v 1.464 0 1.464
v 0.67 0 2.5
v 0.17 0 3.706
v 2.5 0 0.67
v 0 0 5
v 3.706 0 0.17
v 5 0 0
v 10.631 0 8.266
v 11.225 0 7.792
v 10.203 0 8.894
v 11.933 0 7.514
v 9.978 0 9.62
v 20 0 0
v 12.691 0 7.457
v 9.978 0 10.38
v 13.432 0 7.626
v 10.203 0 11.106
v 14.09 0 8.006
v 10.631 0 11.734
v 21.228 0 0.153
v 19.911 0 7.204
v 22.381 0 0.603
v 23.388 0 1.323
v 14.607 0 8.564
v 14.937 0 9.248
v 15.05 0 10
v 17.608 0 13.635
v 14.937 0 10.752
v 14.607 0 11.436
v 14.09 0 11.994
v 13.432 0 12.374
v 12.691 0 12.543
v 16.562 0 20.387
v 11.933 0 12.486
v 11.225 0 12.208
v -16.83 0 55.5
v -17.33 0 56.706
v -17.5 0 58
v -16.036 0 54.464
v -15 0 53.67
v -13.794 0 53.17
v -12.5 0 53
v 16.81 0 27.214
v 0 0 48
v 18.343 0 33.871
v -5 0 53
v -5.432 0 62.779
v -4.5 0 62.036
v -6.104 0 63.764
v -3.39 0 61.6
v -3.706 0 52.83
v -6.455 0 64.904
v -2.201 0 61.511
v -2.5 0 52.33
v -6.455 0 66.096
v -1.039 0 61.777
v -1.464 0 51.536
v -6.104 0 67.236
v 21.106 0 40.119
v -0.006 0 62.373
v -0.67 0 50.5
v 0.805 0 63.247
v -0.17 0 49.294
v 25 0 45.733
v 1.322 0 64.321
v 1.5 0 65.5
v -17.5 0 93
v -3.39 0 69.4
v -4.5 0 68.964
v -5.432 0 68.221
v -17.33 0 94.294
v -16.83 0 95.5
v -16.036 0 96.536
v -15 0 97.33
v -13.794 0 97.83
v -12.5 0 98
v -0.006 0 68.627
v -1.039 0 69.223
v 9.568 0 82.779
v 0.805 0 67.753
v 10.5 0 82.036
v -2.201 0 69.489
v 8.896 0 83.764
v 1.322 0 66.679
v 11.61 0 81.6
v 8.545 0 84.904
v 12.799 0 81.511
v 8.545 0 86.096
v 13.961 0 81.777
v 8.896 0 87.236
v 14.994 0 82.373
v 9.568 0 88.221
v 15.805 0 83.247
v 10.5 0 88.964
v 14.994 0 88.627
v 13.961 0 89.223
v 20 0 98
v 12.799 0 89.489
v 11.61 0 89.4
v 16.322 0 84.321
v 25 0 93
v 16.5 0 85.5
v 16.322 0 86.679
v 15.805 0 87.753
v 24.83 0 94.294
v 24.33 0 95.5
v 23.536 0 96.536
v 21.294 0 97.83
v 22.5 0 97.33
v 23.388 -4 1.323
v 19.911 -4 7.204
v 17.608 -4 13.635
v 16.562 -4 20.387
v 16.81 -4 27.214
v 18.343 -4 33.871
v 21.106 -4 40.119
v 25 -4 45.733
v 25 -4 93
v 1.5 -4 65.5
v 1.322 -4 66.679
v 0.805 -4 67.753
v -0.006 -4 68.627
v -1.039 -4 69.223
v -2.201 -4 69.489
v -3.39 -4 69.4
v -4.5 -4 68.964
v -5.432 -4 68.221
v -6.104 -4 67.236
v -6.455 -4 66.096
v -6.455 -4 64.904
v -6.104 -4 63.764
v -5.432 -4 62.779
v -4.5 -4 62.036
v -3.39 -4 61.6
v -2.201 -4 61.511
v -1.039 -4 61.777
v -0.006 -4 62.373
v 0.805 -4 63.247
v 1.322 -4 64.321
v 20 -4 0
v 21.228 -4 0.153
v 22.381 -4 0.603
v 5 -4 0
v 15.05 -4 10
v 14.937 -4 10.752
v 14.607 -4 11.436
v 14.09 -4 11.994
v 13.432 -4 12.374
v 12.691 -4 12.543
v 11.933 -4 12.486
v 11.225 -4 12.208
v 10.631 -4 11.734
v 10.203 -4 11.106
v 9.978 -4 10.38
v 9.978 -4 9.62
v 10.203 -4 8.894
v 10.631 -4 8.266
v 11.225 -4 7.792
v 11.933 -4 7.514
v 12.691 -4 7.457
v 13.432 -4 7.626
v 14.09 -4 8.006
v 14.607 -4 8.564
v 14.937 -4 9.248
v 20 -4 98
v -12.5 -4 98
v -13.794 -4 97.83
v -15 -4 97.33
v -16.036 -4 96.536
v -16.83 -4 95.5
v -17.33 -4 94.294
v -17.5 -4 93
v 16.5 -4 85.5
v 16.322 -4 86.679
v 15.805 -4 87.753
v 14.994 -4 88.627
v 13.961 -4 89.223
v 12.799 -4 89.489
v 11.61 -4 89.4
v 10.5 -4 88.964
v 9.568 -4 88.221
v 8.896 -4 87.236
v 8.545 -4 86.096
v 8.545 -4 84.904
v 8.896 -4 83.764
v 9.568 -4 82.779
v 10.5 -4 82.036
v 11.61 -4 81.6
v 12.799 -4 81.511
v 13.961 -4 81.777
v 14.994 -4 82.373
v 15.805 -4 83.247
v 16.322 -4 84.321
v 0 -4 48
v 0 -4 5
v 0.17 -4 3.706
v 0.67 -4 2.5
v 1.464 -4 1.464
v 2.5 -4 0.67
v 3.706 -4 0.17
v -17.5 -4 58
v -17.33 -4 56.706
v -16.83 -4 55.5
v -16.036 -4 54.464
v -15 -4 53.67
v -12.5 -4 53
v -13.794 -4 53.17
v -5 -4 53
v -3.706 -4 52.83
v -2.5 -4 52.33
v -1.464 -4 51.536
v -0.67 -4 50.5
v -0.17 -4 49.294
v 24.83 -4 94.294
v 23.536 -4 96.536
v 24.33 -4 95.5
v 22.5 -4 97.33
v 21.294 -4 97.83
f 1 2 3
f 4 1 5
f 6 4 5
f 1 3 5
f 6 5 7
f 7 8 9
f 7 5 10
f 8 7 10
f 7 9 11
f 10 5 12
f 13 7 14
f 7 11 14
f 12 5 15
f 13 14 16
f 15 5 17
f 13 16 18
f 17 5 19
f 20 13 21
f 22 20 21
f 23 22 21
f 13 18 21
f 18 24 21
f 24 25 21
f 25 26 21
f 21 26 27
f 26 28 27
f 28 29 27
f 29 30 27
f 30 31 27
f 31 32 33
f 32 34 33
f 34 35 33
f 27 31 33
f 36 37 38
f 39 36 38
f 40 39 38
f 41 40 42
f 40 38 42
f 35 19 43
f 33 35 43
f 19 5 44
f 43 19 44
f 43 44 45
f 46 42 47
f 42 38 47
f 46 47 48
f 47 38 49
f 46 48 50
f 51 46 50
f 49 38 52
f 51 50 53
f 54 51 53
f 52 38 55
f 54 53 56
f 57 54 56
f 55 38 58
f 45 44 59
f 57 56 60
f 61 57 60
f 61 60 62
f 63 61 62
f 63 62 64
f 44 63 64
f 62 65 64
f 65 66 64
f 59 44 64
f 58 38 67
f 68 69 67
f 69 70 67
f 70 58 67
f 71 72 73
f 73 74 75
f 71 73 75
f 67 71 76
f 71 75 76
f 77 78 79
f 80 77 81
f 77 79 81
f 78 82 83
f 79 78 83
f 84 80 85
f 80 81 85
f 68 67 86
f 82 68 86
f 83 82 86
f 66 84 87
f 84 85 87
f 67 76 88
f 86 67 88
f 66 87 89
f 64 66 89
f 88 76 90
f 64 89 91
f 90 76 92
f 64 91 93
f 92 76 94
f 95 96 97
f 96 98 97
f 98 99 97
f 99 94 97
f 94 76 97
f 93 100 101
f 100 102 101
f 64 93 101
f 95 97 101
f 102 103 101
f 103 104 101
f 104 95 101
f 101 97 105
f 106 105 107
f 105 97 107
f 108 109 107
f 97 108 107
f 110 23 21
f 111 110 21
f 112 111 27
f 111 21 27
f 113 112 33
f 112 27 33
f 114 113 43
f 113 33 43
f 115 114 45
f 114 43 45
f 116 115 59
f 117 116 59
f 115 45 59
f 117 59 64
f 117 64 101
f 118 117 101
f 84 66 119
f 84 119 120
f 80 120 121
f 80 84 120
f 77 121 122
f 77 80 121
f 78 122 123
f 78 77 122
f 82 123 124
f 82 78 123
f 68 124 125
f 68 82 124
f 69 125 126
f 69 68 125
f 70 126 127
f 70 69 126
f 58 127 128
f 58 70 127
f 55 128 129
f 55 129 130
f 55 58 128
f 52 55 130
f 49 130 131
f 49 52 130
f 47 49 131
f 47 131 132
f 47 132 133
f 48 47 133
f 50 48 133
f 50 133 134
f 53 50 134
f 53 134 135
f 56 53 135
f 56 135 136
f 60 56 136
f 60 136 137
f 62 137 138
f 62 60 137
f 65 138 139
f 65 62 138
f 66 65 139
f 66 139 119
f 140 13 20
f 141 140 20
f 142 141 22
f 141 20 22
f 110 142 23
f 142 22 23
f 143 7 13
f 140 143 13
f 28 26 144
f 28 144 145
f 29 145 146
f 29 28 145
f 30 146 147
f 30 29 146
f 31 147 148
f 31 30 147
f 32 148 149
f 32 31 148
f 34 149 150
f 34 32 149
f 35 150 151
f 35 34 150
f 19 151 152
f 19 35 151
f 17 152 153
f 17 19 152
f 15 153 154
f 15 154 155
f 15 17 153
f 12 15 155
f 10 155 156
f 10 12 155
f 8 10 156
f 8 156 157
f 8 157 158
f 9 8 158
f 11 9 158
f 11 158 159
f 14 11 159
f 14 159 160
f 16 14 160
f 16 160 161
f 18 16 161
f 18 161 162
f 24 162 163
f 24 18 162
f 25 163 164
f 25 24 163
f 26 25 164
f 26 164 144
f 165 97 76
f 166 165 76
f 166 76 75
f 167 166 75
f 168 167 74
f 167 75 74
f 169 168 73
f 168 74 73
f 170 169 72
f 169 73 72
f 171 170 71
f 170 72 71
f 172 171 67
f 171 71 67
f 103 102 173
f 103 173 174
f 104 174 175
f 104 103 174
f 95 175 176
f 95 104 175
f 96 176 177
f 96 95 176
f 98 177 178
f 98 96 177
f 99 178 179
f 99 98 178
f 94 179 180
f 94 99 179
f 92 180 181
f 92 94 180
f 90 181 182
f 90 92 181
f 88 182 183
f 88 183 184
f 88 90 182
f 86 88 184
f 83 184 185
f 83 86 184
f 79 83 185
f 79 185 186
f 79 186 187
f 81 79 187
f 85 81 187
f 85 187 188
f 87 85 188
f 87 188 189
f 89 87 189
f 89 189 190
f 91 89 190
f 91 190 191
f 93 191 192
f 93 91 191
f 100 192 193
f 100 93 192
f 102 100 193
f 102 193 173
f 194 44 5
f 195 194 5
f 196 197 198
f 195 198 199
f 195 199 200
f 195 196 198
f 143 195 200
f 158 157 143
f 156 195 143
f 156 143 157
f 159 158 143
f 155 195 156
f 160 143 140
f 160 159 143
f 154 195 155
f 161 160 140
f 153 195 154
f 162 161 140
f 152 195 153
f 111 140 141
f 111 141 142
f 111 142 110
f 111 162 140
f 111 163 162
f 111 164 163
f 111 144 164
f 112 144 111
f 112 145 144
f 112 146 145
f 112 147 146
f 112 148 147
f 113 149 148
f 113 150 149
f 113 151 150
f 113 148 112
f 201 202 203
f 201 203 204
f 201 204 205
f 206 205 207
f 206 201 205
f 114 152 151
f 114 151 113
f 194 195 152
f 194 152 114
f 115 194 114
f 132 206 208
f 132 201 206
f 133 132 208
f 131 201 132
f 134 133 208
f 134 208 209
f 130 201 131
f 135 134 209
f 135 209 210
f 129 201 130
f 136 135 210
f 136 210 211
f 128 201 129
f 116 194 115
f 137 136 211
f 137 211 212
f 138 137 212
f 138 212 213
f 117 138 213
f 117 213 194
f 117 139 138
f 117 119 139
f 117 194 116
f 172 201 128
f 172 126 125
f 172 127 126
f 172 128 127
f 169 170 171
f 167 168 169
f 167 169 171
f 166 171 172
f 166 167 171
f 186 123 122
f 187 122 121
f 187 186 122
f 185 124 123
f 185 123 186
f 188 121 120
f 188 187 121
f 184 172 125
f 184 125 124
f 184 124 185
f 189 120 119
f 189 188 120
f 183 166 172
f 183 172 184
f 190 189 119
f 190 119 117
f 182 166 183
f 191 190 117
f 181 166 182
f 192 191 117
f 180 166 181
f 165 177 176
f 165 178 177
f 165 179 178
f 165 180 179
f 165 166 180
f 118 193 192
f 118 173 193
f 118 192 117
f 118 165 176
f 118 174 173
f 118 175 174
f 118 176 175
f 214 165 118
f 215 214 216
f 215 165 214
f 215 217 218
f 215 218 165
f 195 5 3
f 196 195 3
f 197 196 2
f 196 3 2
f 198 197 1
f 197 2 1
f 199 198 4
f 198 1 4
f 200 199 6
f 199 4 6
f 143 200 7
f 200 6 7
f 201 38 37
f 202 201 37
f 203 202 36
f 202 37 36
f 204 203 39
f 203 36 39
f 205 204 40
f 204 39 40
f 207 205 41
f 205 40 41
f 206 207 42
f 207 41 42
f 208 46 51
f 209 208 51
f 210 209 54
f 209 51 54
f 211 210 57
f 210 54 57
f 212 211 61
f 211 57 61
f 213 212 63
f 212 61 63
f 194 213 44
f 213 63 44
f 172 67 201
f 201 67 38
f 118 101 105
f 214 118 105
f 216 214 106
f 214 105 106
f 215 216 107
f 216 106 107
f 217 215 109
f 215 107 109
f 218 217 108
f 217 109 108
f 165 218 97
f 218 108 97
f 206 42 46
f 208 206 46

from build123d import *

# Parameters (mm, degrees)
F0_R     = 2.55
F0_R_2   = 4
F1_DEPTH = 4


with BuildPart() as f1:
    # F0 (on Front) → F1 (new body)
    with BuildSketch(Plane.XZ):
        with BuildLine():
            Line((0, 48), (0, 5))
            ThreePointArc((0, 5), (1.464466, 1.464466), (5, 0))
            Line((5, 0), (20, 0))
            ThreePointArc((20, 0), (21.81842, 0.342388), (23.387798, 1.322661))
            ThreePointArc((23.387798, 1.322661), (16.523699, 23.80604), (25, 45.73252))
            Line((25, 45.73252), (25, 93))
            ThreePointArc((25, 93), (23.535534, 96.535534), (20, 98))
            Line((20, 98), (-12.5, 98))
            ThreePointArc((-12.5, 98), (-16.035534, 96.535534), (-17.5, 93))
            Line((-17.5, 93), (-17.5, 58))
            ThreePointArc((-17.5, 58), (-16.035534, 54.464466), (-12.5, 53))
            Line((-12.5, 53), (-5, 53))
            ThreePointArc((-5, 53), (-1.464466, 51.535534), (0, 48))
        make_face()
        with Locations((12.5, 10)):
            Circle(F0_R, mode=Mode.SUBTRACT)
        with Locations((-2.5, 65.5)):
            Circle(F0_R_2, mode=Mode.SUBTRACT)
        with Locations((12.5, 85.5)):
            Circle(F0_R_2, mode=Mode.SUBTRACT)
    extrude(amount=F1_DEPTH)


solid = f1.part
